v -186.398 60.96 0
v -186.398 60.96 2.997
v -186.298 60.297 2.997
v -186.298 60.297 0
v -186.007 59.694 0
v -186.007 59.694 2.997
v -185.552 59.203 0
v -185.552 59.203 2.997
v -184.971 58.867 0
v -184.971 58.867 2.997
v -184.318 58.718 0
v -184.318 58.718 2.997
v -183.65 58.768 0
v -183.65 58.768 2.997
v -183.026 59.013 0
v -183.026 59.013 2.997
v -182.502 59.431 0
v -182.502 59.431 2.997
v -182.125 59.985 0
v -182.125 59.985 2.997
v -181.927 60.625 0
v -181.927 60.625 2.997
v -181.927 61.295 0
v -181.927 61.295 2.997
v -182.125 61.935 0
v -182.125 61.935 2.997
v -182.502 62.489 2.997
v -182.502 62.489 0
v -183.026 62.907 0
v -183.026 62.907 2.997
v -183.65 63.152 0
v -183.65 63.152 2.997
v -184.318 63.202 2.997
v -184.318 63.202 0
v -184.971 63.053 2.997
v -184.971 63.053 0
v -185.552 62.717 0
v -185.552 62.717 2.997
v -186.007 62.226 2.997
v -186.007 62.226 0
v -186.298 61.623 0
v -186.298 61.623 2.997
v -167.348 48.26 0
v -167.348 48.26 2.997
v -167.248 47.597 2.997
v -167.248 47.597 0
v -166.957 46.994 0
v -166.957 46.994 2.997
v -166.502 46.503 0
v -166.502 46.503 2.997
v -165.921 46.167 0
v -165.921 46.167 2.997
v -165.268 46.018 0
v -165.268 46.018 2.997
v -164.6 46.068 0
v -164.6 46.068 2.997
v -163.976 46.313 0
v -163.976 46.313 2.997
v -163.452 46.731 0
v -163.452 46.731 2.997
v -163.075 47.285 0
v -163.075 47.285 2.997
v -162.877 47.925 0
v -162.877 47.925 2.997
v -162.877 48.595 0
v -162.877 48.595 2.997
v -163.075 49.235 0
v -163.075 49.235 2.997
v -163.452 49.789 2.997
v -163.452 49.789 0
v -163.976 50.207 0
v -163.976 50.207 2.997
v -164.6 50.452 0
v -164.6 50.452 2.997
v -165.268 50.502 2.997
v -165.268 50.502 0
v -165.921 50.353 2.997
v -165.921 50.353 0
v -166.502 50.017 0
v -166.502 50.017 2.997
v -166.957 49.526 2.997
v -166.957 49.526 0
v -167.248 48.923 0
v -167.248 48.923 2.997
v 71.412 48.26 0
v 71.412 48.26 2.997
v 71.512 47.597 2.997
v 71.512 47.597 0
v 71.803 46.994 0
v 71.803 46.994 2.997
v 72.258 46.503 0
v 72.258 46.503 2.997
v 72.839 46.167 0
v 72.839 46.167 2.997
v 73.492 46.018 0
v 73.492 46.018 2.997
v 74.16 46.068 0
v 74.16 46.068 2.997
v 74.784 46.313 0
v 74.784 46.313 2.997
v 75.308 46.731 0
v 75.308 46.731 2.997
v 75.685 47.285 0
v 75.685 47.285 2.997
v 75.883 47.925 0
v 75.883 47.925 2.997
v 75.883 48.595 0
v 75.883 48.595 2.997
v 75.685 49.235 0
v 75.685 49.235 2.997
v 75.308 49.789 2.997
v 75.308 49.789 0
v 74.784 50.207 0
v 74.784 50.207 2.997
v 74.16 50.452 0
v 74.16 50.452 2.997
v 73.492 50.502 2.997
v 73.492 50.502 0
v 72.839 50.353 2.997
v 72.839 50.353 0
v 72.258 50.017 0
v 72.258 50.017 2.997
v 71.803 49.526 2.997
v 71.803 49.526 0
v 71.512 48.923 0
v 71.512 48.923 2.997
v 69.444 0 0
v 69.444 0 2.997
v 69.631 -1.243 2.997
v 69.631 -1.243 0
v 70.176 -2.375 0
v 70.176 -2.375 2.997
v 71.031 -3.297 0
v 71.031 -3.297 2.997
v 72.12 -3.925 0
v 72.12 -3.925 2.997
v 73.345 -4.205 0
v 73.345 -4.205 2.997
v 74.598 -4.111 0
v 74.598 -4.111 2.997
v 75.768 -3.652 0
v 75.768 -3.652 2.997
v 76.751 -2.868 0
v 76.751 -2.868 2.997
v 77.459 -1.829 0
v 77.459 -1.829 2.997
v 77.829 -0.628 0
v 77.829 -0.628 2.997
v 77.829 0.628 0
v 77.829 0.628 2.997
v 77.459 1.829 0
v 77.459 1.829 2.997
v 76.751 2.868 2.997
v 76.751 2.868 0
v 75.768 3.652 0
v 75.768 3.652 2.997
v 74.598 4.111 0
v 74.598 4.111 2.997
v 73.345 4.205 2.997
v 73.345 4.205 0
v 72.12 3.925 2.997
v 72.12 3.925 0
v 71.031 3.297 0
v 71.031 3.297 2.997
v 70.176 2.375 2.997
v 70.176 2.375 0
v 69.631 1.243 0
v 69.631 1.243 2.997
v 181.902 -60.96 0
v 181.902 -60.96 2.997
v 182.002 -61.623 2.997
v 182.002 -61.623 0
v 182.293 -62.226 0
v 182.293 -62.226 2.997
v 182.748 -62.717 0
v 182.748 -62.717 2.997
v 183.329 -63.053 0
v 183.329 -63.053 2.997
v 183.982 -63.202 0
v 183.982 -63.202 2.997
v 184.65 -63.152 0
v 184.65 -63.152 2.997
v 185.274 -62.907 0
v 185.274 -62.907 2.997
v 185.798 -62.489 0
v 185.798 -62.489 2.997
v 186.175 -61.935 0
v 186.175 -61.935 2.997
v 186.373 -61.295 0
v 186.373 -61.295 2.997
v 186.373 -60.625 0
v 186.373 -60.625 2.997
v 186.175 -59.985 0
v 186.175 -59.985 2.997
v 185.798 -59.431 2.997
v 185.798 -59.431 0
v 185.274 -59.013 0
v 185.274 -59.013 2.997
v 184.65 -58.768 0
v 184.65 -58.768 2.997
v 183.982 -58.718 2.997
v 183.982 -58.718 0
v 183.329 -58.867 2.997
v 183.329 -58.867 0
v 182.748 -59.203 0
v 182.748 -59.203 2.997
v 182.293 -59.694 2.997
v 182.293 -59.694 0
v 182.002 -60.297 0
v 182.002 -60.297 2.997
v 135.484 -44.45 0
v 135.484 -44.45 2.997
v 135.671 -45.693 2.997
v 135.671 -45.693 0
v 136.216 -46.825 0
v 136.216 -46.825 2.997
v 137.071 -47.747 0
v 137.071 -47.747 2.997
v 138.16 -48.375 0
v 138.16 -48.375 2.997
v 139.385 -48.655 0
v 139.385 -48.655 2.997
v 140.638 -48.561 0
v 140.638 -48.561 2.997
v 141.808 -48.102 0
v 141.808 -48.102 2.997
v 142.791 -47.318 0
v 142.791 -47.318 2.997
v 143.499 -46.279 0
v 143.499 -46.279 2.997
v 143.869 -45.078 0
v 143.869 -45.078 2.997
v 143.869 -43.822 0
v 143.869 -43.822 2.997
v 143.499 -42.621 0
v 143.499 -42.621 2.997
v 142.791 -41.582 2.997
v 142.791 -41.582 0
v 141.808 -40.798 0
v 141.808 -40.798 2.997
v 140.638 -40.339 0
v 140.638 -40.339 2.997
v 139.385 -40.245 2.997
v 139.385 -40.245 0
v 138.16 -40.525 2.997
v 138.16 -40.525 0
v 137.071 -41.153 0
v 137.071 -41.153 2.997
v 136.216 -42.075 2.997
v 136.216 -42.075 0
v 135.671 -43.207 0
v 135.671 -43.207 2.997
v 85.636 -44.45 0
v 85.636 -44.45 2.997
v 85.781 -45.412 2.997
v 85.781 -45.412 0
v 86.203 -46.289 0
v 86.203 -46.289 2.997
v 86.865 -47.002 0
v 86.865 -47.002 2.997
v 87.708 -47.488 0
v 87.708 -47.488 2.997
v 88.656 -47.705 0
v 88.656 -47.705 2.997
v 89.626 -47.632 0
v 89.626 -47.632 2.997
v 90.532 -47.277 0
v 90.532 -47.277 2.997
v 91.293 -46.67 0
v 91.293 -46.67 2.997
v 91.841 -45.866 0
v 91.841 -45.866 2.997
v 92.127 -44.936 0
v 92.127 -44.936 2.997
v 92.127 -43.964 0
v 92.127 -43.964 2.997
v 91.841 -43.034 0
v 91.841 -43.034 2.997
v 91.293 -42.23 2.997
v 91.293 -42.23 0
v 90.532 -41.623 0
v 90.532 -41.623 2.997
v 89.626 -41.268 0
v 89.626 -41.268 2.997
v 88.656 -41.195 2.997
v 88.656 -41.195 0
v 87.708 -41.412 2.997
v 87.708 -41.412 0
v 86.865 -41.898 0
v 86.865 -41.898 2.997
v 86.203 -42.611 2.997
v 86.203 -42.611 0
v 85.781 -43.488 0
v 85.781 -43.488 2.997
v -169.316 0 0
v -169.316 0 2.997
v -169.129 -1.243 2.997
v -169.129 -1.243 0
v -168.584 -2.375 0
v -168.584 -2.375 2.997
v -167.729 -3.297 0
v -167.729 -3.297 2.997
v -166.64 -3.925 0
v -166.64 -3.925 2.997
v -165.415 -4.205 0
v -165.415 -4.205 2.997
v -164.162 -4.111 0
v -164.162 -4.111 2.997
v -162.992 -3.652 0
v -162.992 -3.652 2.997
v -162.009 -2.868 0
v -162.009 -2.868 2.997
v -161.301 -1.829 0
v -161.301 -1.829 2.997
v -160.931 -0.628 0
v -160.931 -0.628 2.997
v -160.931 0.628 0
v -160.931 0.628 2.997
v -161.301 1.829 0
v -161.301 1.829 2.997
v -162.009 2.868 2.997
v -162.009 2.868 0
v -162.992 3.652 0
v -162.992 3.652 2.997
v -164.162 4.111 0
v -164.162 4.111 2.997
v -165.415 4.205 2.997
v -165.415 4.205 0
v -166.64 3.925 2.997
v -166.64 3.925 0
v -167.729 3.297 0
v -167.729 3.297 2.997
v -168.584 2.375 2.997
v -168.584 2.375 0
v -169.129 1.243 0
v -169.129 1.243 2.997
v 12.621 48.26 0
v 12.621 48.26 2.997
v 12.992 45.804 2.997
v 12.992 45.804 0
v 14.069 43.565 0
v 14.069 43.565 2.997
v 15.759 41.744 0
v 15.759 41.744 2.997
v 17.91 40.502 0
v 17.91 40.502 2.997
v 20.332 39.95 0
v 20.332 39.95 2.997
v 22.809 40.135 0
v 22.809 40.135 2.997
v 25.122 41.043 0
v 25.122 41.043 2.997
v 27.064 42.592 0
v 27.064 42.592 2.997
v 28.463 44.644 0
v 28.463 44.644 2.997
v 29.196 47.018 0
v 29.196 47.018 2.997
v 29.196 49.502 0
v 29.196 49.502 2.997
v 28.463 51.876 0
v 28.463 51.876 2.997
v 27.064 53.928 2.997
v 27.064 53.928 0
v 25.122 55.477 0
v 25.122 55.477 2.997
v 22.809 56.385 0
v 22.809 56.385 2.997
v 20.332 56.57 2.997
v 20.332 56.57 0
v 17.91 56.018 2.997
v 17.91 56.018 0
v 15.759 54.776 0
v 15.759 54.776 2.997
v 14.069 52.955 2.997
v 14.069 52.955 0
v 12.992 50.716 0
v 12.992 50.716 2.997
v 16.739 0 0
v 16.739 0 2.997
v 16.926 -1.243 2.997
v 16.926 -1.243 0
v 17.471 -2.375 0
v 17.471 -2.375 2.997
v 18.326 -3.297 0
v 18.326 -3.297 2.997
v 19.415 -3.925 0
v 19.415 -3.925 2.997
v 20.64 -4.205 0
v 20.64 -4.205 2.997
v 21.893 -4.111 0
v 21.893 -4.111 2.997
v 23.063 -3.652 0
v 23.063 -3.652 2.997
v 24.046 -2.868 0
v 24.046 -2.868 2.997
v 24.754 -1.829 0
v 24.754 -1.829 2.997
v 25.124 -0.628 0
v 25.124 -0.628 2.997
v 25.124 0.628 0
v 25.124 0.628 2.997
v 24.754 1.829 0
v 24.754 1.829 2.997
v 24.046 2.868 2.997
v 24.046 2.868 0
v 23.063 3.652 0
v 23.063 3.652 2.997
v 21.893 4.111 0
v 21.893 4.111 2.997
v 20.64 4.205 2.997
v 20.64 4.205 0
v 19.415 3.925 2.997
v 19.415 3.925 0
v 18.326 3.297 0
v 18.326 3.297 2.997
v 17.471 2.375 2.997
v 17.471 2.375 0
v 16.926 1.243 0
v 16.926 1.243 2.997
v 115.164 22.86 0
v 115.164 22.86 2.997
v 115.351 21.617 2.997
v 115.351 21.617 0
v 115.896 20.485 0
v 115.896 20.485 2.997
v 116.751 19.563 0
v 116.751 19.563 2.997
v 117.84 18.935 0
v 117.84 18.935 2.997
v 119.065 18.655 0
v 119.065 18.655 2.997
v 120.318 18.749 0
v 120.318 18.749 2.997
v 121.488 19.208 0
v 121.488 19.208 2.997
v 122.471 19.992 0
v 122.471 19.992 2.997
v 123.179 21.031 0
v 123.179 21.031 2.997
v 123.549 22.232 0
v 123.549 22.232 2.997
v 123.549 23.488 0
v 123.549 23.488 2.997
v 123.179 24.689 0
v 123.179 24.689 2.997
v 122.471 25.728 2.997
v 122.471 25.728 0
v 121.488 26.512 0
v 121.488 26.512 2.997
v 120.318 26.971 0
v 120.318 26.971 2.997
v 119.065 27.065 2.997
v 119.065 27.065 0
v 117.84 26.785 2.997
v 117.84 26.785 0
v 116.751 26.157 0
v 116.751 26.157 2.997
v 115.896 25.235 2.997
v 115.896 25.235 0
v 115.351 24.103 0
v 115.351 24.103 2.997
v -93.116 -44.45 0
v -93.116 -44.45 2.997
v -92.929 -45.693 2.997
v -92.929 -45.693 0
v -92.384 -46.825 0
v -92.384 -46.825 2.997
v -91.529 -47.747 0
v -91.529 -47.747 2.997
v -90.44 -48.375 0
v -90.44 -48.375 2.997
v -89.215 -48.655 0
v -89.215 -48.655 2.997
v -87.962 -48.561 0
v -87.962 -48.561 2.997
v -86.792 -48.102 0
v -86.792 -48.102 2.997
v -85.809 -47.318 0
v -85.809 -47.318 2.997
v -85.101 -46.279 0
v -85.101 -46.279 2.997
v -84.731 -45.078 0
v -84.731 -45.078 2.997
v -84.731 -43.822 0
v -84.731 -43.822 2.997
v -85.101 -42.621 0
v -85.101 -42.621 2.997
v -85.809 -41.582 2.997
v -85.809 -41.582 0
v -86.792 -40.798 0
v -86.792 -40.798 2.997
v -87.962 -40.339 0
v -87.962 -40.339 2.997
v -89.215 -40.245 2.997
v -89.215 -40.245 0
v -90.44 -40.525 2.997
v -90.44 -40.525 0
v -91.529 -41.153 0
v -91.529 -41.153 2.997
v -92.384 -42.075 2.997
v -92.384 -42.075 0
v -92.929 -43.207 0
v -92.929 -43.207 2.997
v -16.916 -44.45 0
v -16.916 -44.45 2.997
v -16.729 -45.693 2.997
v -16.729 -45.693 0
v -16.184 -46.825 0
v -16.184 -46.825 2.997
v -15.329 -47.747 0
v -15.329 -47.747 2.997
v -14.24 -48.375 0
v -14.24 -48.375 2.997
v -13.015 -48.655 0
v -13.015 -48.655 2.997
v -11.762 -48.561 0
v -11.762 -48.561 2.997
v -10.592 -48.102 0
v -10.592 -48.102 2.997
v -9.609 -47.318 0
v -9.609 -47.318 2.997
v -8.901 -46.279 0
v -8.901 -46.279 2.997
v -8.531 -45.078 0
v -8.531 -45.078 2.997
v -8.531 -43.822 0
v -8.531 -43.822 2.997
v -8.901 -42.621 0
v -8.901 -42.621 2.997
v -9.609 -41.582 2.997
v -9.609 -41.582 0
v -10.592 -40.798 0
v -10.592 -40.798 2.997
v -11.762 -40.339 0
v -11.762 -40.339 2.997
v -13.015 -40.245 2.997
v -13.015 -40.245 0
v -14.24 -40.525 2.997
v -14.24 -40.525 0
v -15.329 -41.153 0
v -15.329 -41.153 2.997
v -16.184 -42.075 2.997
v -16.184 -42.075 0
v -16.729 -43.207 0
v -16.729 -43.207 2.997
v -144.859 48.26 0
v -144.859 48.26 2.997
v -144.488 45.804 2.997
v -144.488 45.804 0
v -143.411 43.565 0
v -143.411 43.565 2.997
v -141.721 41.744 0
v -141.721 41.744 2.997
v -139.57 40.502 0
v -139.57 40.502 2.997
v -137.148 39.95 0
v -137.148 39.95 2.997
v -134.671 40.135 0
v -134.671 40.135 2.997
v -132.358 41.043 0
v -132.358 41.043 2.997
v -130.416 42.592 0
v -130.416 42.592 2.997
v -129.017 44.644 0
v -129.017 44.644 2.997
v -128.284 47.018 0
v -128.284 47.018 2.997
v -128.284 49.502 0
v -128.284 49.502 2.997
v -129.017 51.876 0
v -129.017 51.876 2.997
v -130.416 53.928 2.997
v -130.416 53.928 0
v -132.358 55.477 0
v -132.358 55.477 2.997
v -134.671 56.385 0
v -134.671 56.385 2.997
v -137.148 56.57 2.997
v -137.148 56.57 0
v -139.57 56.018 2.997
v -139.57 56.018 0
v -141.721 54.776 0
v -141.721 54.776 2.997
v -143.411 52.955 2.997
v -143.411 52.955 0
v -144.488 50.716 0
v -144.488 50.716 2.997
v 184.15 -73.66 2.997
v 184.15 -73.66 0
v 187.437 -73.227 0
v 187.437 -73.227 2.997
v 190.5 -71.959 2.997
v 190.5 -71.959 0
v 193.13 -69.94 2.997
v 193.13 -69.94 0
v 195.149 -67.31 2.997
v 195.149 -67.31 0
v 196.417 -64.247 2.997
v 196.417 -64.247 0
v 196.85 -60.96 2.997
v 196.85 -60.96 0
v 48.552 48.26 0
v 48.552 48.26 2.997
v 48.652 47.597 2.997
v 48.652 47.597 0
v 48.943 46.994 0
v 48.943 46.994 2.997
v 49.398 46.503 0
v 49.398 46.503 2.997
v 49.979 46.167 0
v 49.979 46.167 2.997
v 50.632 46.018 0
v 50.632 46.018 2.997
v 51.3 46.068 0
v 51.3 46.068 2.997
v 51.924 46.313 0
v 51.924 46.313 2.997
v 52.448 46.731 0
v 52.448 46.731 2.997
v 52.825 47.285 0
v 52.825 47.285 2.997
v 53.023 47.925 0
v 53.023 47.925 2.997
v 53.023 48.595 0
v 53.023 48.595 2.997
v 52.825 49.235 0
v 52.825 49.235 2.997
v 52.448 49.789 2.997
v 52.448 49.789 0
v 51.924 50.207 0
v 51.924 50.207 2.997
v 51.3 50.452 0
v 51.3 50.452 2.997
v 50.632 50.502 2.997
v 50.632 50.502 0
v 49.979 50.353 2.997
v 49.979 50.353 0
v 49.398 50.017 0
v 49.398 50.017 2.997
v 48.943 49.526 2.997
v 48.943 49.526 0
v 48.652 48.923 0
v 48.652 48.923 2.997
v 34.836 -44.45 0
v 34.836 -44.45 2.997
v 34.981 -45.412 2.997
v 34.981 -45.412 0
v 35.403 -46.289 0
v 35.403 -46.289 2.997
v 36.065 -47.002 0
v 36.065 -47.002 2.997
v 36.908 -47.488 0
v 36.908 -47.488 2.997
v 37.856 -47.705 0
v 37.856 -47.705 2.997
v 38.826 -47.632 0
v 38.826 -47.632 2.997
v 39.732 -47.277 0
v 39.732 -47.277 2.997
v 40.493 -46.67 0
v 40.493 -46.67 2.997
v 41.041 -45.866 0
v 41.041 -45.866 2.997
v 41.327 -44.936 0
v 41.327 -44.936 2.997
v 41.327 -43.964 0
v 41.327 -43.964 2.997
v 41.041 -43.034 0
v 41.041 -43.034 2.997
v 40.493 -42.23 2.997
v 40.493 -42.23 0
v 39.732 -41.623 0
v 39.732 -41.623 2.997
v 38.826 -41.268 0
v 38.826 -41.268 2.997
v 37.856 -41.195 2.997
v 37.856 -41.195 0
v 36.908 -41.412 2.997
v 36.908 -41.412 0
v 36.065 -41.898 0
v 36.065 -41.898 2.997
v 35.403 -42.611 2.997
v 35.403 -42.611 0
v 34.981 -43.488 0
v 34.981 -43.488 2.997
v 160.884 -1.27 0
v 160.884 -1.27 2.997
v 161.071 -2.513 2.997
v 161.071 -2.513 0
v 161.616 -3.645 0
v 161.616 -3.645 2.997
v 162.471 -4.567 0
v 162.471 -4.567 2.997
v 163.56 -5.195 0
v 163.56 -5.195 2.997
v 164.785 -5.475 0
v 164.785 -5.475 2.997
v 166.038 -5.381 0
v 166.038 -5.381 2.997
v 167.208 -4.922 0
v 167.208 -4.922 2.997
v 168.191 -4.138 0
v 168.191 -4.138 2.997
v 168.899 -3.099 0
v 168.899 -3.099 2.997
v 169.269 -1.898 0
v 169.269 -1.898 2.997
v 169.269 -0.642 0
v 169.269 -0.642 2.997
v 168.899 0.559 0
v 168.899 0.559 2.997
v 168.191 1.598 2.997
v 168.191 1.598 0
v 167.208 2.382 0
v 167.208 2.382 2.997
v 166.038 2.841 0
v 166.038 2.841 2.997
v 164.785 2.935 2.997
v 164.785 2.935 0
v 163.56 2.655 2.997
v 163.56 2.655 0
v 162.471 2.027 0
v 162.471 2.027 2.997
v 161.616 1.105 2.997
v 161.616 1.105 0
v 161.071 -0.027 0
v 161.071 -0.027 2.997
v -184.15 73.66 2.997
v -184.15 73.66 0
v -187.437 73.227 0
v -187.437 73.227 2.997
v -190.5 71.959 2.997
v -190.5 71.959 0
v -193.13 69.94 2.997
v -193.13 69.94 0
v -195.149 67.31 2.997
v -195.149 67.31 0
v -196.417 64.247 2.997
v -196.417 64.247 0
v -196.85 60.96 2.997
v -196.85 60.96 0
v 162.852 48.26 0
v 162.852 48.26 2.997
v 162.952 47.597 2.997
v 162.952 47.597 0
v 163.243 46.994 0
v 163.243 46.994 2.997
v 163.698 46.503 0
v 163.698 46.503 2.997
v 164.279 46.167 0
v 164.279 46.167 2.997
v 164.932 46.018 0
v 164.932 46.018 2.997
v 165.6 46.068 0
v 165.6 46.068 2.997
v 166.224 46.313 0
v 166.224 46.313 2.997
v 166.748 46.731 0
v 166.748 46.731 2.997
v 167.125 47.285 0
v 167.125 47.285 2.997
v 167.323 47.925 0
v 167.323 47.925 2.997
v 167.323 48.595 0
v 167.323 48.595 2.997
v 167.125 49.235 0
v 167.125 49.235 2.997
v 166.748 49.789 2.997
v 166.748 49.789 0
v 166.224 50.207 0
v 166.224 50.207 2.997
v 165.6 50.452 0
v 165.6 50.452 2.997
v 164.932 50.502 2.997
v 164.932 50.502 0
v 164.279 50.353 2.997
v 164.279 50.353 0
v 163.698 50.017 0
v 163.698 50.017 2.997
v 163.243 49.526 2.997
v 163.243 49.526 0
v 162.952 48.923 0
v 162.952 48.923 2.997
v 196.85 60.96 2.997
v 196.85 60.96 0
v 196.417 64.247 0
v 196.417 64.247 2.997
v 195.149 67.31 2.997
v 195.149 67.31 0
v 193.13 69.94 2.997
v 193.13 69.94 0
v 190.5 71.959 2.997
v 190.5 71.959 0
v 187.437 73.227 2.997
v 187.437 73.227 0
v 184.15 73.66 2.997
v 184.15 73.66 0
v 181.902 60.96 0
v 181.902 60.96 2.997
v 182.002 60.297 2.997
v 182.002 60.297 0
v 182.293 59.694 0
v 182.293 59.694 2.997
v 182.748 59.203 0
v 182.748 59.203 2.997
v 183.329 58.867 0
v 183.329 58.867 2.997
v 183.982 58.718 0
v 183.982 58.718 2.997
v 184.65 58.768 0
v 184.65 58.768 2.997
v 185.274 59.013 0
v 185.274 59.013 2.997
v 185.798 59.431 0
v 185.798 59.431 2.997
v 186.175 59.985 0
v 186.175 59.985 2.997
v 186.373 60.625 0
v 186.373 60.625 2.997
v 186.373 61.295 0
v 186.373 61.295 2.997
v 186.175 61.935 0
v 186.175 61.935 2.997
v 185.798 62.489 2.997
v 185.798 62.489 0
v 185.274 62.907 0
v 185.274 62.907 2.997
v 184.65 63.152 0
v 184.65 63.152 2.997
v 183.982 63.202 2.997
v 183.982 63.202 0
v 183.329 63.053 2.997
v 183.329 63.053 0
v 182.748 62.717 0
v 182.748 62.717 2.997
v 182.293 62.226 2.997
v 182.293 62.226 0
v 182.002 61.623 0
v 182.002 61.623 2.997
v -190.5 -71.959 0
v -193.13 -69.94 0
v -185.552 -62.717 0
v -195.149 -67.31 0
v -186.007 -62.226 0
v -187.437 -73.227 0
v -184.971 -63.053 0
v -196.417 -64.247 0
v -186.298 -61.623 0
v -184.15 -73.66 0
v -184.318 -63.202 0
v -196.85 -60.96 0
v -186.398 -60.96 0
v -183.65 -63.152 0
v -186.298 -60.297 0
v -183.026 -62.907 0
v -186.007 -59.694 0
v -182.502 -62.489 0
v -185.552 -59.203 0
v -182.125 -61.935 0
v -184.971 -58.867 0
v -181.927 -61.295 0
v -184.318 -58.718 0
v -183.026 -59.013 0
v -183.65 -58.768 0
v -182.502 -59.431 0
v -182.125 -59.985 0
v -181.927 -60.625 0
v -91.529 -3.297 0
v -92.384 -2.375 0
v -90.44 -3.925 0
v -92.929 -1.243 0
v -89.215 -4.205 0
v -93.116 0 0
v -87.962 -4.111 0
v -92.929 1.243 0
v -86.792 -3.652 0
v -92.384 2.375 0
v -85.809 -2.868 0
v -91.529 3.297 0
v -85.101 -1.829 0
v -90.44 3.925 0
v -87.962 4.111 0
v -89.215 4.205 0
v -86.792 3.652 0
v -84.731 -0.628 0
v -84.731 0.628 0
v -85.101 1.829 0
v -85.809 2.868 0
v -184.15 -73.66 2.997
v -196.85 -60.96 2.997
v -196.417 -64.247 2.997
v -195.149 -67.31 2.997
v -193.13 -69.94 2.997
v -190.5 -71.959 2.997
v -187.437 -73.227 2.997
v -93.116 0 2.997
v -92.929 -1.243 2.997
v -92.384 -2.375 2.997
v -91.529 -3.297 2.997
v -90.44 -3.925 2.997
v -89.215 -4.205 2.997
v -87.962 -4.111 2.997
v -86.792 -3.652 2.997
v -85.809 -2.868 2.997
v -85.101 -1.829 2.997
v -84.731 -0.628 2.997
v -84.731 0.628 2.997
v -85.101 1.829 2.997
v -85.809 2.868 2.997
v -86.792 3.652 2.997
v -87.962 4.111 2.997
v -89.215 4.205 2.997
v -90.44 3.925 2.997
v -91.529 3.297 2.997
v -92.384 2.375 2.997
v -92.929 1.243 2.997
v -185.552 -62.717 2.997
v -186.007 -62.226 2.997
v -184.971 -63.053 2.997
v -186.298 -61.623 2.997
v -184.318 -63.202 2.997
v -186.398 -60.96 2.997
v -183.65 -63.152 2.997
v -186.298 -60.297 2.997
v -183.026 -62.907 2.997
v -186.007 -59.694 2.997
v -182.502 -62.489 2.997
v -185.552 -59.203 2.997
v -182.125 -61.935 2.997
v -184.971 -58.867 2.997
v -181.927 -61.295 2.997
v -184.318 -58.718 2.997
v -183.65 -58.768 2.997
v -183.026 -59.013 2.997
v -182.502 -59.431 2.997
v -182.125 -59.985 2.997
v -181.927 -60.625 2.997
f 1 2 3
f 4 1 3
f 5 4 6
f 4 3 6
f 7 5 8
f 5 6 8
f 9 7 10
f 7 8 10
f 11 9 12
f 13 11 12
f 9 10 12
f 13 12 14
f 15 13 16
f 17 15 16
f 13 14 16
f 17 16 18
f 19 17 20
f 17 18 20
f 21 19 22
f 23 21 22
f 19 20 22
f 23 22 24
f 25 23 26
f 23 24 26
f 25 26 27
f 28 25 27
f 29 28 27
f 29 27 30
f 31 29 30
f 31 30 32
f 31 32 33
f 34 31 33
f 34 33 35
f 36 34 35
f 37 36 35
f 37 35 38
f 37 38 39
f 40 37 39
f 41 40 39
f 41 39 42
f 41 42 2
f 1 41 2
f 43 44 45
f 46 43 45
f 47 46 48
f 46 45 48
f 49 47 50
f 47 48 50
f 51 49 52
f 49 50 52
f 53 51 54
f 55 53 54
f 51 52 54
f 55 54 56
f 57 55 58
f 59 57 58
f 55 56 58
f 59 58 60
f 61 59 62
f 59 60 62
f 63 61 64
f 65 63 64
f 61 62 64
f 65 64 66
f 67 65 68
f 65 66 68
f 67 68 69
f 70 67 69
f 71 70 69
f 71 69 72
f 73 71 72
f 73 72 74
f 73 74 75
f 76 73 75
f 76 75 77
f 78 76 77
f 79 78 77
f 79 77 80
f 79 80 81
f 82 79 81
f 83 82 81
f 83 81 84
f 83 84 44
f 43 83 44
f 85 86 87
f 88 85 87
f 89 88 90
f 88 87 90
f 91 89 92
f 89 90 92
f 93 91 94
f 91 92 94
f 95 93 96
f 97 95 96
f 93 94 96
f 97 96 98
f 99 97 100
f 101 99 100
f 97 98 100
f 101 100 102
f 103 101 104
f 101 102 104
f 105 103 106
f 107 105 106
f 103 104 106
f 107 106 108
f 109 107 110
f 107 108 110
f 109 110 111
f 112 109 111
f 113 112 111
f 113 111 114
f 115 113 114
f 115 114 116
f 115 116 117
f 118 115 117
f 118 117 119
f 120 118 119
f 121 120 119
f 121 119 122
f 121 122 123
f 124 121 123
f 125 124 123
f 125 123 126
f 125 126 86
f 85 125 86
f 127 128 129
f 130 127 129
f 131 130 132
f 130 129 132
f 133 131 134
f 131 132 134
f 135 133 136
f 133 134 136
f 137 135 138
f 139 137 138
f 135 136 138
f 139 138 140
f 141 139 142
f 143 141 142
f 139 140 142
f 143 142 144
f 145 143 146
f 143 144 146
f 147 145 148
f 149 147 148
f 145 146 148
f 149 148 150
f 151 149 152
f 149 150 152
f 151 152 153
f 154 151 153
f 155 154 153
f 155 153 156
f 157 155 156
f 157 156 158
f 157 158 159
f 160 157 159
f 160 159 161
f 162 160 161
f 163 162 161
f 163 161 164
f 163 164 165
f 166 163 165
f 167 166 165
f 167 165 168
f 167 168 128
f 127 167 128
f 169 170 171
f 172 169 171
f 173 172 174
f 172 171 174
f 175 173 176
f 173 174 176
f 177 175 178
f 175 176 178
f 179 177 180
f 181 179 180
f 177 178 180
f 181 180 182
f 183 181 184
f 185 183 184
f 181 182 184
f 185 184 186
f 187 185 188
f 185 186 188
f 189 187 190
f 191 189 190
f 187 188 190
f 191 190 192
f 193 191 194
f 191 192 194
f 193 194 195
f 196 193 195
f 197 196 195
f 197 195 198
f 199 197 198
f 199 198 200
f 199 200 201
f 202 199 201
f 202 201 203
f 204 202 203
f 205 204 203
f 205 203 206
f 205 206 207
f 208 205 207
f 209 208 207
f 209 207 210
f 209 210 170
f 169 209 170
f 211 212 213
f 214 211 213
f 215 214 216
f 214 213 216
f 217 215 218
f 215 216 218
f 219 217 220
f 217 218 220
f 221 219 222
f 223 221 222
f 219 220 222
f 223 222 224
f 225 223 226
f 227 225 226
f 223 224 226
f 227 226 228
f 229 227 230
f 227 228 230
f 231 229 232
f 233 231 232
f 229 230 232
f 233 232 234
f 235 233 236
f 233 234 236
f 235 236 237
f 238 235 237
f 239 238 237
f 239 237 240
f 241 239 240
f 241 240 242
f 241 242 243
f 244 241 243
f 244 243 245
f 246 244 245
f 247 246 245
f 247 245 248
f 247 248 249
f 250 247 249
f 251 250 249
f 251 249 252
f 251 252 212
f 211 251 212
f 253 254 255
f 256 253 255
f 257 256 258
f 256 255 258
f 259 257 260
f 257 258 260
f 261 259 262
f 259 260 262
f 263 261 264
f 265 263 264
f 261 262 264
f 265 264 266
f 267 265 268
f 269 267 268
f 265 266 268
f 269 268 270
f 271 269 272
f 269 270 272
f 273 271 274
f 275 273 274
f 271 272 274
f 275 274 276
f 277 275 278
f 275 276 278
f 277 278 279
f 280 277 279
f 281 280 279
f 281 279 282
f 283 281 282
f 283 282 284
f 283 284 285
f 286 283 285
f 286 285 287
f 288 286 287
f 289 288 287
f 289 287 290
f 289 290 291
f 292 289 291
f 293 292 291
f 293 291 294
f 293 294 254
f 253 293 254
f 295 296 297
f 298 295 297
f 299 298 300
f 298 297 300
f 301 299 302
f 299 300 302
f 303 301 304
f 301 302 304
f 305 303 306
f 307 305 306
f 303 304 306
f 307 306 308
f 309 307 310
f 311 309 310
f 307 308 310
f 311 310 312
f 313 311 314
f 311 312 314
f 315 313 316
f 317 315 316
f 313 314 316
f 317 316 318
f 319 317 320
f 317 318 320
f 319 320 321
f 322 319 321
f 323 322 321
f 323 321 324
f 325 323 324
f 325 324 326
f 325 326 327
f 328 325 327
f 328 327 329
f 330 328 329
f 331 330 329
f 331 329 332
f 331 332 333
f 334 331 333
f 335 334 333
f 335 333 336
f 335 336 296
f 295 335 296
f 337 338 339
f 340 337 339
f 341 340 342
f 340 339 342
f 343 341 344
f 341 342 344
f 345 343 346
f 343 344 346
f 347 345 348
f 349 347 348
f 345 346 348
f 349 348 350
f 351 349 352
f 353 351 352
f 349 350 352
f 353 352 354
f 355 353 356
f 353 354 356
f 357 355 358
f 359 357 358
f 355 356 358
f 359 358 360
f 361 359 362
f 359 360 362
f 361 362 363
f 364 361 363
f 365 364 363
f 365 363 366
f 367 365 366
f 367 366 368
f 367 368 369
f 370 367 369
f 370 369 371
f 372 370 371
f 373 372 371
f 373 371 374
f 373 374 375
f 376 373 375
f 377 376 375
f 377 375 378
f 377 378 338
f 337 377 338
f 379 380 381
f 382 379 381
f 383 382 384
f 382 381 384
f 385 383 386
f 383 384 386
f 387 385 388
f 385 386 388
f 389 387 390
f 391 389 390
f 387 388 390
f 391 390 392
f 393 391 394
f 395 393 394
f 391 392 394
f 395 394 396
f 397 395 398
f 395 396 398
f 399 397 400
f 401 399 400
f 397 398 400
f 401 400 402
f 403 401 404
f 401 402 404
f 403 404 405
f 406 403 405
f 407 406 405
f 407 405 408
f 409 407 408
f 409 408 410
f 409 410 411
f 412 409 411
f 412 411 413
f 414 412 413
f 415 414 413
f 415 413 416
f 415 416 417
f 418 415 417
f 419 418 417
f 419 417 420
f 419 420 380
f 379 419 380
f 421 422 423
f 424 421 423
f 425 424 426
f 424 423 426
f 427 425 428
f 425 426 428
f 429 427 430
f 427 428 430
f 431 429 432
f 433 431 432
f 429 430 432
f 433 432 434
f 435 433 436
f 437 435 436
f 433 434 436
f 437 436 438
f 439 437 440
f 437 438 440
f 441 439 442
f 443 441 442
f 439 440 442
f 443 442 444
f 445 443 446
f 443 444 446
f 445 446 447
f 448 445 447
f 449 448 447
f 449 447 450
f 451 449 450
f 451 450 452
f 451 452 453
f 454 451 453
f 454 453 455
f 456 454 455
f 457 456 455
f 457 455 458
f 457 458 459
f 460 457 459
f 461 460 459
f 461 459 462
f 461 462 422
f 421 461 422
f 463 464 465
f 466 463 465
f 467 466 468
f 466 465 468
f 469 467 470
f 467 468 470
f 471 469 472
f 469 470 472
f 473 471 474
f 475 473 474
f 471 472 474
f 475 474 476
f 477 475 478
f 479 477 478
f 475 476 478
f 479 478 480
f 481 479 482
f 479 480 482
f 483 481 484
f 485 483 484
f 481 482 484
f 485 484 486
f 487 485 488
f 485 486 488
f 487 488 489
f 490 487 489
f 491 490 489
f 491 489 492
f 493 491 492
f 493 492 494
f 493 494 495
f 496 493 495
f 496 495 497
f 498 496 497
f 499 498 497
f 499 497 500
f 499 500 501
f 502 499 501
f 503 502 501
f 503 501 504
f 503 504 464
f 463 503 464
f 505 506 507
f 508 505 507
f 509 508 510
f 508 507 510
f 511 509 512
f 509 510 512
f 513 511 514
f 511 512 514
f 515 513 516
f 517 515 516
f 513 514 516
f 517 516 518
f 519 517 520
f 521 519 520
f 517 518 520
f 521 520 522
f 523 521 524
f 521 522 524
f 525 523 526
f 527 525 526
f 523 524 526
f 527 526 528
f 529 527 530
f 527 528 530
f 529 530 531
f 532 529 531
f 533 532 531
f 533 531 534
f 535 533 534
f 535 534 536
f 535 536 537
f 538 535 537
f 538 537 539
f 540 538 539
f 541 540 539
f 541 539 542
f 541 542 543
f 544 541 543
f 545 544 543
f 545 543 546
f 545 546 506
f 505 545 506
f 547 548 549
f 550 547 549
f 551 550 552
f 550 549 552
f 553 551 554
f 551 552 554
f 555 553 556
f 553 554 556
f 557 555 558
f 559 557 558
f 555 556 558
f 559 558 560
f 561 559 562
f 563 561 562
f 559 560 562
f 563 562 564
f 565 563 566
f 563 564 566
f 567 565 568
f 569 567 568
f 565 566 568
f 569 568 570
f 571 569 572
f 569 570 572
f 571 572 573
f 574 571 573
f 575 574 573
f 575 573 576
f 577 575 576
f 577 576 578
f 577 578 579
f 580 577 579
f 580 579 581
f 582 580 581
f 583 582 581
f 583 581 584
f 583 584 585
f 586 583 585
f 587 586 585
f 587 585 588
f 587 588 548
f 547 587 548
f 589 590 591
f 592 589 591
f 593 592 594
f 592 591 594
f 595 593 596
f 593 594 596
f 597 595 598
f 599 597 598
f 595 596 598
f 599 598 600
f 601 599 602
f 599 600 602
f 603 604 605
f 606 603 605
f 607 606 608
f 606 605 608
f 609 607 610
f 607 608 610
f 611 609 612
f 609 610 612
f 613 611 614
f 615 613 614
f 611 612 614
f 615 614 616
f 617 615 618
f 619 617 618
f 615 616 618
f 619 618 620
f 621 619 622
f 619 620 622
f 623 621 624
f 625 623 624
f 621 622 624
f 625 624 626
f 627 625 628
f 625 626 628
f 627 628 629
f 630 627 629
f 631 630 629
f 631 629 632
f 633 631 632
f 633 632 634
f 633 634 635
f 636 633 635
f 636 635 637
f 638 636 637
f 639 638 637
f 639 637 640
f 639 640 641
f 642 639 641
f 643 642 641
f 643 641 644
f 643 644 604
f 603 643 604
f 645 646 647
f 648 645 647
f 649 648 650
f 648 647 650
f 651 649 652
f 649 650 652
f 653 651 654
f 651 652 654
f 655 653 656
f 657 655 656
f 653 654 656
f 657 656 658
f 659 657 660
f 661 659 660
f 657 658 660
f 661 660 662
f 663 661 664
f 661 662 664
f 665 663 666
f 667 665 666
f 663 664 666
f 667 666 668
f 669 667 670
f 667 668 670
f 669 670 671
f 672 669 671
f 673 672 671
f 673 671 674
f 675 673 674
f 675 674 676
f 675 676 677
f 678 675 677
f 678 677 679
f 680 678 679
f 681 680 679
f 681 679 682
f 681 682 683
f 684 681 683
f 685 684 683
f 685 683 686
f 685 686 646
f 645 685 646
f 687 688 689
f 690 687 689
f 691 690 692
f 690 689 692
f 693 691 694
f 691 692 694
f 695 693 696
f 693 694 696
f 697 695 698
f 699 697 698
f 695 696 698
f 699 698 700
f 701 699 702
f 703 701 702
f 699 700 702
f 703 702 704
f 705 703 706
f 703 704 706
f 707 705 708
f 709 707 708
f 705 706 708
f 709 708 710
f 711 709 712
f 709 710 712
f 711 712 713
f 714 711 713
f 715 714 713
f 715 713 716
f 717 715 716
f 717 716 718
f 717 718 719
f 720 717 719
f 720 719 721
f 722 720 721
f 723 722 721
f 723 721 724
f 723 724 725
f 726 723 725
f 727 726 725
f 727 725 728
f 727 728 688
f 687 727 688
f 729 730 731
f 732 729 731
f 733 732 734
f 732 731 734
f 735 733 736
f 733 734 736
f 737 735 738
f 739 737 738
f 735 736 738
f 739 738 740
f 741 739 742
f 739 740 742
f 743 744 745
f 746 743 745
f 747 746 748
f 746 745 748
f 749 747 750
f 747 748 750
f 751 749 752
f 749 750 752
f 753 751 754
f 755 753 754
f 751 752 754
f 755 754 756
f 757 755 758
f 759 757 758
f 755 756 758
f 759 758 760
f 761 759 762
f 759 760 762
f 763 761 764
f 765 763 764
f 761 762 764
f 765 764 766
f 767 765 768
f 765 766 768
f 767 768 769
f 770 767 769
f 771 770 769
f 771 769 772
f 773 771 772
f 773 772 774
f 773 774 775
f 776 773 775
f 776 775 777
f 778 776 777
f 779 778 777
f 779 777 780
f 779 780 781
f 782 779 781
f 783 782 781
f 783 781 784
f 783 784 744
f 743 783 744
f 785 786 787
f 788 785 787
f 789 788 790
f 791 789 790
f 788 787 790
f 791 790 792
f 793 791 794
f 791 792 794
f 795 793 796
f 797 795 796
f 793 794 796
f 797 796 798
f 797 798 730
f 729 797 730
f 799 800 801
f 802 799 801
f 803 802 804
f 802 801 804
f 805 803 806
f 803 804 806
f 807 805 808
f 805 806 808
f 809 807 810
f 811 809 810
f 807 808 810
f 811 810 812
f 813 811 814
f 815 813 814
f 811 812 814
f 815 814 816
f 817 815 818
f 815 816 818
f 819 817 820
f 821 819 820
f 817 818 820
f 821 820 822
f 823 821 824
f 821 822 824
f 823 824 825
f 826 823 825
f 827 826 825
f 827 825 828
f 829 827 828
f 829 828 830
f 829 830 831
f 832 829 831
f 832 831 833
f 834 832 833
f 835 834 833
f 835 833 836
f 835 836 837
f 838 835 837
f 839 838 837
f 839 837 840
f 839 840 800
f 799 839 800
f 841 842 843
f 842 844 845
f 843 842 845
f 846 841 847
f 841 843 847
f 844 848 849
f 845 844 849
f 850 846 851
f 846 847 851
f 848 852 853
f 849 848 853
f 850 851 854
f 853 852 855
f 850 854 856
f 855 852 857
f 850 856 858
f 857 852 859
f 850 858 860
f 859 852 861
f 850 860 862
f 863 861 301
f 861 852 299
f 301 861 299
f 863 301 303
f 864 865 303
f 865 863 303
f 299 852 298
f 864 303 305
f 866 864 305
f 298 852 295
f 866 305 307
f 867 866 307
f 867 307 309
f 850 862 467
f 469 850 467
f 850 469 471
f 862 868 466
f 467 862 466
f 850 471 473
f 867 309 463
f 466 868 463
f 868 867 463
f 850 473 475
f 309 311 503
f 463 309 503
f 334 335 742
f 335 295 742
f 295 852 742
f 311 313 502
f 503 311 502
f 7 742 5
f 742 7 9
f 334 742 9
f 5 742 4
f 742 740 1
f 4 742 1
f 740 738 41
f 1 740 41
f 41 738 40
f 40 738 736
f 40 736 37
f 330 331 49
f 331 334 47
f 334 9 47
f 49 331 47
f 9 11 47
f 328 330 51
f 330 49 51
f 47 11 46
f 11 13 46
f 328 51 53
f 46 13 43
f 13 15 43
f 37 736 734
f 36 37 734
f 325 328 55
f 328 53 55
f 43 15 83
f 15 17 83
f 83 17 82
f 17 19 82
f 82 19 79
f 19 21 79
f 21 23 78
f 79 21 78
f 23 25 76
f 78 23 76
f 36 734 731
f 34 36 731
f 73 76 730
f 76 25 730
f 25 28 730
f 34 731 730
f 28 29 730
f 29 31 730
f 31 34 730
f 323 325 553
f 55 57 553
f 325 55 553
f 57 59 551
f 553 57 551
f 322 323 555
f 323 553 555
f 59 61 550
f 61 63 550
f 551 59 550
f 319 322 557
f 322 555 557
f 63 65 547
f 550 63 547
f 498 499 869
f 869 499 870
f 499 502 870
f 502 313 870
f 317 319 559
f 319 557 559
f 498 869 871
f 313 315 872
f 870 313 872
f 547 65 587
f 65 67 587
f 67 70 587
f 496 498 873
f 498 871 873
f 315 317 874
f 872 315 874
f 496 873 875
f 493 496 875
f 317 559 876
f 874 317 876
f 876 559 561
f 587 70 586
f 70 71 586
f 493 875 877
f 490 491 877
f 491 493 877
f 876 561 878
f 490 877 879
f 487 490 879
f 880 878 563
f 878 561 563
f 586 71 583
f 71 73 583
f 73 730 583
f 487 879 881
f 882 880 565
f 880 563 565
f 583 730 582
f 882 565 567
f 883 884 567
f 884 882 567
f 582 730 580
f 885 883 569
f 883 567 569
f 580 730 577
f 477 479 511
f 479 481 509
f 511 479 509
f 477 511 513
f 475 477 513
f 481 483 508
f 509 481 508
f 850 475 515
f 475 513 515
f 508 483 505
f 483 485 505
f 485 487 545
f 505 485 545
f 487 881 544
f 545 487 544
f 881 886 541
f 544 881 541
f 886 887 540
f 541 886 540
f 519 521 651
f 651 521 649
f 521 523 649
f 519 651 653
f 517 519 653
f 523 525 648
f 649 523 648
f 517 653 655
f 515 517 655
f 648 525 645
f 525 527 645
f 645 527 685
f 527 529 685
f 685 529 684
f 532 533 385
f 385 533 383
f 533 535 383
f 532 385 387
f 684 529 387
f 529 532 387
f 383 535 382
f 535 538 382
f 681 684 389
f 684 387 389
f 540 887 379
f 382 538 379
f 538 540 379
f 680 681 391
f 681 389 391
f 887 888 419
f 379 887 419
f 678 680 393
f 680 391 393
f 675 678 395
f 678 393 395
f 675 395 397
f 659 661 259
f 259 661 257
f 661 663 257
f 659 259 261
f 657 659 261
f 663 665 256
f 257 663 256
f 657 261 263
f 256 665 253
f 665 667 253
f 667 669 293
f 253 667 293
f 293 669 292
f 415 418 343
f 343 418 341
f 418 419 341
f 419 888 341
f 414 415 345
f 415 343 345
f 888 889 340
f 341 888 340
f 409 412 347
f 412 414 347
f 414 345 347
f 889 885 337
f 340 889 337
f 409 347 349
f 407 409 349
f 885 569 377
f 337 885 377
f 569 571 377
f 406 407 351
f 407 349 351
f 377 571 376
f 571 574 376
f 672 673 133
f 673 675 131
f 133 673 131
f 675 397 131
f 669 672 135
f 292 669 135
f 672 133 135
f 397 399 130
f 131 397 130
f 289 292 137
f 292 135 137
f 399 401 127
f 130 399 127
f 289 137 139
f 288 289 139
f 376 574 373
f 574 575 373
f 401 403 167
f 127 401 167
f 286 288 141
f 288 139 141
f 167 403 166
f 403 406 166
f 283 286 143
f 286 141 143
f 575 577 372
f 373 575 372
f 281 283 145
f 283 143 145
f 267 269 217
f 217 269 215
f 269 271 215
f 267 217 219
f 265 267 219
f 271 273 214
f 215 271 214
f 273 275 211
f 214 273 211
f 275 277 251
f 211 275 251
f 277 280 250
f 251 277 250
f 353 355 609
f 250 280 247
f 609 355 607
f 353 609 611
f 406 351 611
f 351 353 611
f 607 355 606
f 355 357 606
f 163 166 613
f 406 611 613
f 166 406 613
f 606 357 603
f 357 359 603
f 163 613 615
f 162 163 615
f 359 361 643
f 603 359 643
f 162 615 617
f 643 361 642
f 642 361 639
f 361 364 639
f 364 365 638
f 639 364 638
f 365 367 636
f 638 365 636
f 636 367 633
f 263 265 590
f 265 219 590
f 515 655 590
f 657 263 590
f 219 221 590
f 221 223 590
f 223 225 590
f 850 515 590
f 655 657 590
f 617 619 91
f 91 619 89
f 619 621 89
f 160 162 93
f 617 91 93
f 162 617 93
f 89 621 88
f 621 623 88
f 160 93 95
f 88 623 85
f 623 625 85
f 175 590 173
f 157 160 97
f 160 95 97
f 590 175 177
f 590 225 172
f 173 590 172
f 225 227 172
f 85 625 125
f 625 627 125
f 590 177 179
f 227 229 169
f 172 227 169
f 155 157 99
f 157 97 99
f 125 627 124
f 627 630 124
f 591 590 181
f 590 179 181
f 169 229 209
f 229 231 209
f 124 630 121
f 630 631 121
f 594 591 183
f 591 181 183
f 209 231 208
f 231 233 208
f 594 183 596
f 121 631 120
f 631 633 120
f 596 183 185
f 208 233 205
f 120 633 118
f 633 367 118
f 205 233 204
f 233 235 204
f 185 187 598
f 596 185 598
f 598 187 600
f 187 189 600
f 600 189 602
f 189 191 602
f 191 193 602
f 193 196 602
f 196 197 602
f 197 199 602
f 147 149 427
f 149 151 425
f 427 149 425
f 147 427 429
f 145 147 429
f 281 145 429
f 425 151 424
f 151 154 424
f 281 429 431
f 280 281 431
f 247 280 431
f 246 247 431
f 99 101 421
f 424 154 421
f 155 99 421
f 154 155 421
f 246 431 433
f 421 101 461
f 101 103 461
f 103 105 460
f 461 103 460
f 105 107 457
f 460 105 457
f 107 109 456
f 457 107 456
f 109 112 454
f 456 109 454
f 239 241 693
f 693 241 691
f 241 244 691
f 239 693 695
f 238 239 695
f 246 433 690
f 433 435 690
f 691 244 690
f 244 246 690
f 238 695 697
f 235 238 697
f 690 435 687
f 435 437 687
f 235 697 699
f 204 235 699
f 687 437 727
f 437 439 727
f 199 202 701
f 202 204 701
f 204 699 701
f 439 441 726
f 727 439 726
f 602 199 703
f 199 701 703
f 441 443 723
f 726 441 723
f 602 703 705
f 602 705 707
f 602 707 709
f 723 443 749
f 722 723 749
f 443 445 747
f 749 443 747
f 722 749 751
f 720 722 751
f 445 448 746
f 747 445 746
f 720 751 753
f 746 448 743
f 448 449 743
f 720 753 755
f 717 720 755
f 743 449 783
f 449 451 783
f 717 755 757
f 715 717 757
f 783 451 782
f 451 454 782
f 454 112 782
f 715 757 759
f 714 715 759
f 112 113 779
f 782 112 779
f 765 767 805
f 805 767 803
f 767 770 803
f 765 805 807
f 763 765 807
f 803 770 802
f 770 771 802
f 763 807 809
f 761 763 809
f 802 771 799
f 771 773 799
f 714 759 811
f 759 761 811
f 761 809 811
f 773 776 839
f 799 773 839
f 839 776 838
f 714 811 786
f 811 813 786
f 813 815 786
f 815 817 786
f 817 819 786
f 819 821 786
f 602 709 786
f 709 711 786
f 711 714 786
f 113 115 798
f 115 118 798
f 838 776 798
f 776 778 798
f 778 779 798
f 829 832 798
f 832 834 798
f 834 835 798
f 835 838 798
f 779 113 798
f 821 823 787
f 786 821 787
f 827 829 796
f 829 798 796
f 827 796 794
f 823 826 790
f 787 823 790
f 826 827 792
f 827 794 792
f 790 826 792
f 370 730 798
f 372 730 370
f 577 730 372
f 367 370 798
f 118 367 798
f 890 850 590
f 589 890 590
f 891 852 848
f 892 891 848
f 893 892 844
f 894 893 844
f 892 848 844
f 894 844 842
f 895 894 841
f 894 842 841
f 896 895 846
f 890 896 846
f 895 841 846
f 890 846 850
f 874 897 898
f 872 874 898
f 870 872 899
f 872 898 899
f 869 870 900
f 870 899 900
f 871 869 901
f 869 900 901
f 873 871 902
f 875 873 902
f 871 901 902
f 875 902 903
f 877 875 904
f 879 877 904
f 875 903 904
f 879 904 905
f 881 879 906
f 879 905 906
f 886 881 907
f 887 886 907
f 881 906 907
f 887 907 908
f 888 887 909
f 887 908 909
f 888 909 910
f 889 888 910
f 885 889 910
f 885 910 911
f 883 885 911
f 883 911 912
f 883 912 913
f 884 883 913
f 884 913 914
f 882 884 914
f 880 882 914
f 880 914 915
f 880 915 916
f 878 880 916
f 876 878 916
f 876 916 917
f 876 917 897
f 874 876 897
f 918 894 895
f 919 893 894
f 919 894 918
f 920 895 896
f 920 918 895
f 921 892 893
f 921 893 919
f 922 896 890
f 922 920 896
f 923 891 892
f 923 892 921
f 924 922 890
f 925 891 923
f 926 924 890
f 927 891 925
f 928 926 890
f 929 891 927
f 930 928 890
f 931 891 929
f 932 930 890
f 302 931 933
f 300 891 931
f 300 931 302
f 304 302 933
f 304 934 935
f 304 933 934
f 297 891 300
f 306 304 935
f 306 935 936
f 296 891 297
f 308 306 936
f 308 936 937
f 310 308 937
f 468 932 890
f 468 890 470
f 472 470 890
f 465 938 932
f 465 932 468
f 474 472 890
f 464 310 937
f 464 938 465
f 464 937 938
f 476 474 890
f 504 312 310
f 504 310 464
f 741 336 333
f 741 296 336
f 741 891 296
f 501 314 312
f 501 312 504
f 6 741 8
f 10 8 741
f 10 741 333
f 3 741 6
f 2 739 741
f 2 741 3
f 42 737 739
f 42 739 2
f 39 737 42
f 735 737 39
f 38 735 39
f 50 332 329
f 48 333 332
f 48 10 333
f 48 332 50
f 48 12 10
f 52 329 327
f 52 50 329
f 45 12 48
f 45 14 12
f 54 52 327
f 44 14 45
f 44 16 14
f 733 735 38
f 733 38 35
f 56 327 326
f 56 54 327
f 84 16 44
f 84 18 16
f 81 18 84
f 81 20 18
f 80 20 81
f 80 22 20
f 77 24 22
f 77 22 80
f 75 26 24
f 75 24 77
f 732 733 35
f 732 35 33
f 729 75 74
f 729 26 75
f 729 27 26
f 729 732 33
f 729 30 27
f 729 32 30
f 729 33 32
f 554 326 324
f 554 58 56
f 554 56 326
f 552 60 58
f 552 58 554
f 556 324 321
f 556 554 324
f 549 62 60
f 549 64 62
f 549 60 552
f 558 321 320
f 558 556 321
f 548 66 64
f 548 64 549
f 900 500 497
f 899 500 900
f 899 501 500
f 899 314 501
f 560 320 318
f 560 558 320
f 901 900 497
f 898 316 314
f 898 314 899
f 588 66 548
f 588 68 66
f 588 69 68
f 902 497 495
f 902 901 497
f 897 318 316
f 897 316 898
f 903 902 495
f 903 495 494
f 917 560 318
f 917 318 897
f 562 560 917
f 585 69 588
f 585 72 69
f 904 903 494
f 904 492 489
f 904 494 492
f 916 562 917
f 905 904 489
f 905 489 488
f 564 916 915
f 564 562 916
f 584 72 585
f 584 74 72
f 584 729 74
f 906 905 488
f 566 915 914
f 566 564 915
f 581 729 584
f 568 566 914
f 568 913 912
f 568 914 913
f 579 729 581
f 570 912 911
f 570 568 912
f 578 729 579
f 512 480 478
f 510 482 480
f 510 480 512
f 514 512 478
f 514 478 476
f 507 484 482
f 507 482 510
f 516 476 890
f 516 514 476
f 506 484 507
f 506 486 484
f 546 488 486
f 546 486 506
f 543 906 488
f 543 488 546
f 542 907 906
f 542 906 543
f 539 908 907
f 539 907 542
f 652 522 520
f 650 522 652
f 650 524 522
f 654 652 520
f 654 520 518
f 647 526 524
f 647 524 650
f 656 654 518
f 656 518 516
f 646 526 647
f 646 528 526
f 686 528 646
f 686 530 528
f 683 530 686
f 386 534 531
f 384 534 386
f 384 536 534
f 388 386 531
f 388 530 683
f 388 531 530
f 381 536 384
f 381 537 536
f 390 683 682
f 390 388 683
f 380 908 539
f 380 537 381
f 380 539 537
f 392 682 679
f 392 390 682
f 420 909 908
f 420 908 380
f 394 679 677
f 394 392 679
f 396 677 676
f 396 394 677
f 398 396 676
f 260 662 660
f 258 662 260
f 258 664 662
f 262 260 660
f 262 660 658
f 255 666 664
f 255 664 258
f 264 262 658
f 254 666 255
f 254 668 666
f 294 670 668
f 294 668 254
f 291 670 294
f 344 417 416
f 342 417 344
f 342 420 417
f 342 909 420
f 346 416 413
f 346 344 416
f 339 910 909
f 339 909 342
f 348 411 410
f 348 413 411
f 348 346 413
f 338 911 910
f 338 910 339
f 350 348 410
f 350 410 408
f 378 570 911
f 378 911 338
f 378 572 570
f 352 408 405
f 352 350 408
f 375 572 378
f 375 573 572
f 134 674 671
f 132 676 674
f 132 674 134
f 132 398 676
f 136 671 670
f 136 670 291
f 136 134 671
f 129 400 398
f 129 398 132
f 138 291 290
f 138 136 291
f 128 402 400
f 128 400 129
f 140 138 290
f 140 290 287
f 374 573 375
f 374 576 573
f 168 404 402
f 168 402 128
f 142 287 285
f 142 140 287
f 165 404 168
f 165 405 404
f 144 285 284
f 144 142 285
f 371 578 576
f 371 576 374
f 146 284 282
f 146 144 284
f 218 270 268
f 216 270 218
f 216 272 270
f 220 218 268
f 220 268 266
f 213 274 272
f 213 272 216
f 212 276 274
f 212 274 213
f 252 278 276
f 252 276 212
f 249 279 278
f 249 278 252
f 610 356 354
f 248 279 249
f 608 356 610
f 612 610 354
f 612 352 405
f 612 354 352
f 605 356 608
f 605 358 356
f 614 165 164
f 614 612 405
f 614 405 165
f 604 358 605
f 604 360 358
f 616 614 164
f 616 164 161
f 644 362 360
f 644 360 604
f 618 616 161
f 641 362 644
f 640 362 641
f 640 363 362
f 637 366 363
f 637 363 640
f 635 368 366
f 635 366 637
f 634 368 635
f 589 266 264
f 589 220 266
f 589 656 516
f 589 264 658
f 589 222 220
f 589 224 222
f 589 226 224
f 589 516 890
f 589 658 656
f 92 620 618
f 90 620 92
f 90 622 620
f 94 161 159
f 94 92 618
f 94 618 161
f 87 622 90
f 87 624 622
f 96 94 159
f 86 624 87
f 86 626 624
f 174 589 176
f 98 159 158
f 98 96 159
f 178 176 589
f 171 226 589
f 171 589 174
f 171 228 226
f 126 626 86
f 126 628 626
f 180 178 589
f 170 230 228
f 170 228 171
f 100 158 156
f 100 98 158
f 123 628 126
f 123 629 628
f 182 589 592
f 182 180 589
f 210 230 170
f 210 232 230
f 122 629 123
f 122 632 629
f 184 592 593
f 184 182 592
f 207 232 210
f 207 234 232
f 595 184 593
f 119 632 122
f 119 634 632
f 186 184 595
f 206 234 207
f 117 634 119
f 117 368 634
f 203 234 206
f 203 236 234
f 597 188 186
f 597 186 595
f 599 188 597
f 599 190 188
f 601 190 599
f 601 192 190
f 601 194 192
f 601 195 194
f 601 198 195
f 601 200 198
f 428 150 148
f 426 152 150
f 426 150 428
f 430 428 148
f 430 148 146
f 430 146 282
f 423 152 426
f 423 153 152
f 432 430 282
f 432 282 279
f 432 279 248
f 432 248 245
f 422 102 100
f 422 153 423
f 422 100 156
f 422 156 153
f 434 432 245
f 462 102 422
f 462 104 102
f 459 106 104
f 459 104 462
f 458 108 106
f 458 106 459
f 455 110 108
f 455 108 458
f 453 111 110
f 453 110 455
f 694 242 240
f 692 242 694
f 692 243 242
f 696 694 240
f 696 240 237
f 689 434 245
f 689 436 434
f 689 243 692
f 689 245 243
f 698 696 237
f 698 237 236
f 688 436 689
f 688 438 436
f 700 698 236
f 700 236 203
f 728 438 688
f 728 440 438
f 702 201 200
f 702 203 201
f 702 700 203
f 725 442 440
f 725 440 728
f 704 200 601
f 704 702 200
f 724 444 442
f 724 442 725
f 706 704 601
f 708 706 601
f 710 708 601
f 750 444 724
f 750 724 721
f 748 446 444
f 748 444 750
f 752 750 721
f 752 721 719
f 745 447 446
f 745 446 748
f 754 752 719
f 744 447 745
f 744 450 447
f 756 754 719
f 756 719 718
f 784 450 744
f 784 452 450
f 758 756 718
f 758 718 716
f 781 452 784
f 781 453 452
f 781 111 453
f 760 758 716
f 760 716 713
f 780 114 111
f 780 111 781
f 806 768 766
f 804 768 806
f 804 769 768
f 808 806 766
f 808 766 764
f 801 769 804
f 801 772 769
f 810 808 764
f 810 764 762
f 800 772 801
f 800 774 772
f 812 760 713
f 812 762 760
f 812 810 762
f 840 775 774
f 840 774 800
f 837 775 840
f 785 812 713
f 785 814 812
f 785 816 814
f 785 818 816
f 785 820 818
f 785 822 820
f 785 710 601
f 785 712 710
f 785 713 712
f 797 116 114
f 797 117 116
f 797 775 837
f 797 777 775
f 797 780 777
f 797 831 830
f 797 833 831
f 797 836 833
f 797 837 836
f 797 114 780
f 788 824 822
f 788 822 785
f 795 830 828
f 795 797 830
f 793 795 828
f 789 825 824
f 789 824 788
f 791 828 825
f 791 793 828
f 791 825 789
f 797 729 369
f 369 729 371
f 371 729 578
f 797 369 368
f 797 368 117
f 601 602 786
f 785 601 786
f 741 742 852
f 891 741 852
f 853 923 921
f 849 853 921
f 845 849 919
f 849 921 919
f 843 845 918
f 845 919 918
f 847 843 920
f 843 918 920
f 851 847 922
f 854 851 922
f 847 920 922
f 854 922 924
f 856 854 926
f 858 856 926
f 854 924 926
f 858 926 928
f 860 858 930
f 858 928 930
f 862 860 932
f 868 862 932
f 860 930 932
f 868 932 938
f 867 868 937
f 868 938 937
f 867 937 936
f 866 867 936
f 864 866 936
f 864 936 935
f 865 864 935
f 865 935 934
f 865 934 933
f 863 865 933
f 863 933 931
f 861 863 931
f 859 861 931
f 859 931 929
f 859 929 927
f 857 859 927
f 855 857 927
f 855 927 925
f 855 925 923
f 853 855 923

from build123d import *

# Parameters (mm, degrees)
F1_DEPTH = 2.9972
F2_D     = 4.4958
F3_D     = 16.66748
F4_D     = 8.4328
F5_D     = 6.5278


with BuildPart() as f1:
    # F0 (on Top) → F1 (new body)
    with BuildSketch(Plane.XY):
        with BuildLine():
            ThreePointArc((196.85, 60.96), (193.1302561211, 69.9402561211), (184.15, 73.66))
            Line((184.15, 73.66), (-184.15, 73.66))
            ThreePointArc((-184.15, 73.66), (-193.1302561211, 69.9402561211), (-196.85, 60.96))
            Line((-196.85, 60.96), (-196.85, -60.96))
            ThreePointArc((-196.85, -60.96), (-193.1302561211, -69.9402561211), (-184.15, -73.66))
            Line((-184.15, -73.66), (184.15, -73.66))
            ThreePointArc((184.15, -73.66), (193.1302561211, -69.9402561211), (196.85, -60.96))
            Line((196.85, -60.96), (196.85, 60.96))
        make_face()
    extrude(amount=F1_DEPTH)

    # F2 (through all)
    with Locations(Plane(origin=(0, 0, 0), x_dir=(1, 0, 0), z_dir=(0, 0, -1))):
        with Locations((165.1, -48.26), (73.66, -48.26), (50.8, -48.26), (-165.1, -48.26), (-184.15, -60.96), (-184.15, 60.96), (184.15, 60.96), (184.15, -60.96)):
            Hole(F2_D / 2)

    # F3 (through all)
    with Locations(Plane(origin=(0, 0, 0), x_dir=(1, 0, 0), z_dir=(0, 0, -1))):
        with Locations((20.955, -48.26), (-136.525, -48.26)):
            Hole(F3_D / 2)

    # F4 (through all)
    with Locations(Plane(origin=(0, 0, 0), x_dir=(1, 0, 0), z_dir=(0, 0, -1))):
        with Locations((165.1, 1.27), (73.66, 0), (20.955, 0), (-88.9, 0), (139.7, 44.45), (-88.9, 44.45), (-165.1, 0), (119.38, -22.86), (-12.7, 44.45)):
            Hole(F4_D / 2)

    # F5 (through all)
    with Locations(Plane(origin=(0, 0, 0), x_dir=(1, 0, 0), z_dir=(0, 0, -1))):
        with Locations((38.1, 44.45), (88.9, 44.45)):
            Hole(F5_D / 2)


solid = f1.part
